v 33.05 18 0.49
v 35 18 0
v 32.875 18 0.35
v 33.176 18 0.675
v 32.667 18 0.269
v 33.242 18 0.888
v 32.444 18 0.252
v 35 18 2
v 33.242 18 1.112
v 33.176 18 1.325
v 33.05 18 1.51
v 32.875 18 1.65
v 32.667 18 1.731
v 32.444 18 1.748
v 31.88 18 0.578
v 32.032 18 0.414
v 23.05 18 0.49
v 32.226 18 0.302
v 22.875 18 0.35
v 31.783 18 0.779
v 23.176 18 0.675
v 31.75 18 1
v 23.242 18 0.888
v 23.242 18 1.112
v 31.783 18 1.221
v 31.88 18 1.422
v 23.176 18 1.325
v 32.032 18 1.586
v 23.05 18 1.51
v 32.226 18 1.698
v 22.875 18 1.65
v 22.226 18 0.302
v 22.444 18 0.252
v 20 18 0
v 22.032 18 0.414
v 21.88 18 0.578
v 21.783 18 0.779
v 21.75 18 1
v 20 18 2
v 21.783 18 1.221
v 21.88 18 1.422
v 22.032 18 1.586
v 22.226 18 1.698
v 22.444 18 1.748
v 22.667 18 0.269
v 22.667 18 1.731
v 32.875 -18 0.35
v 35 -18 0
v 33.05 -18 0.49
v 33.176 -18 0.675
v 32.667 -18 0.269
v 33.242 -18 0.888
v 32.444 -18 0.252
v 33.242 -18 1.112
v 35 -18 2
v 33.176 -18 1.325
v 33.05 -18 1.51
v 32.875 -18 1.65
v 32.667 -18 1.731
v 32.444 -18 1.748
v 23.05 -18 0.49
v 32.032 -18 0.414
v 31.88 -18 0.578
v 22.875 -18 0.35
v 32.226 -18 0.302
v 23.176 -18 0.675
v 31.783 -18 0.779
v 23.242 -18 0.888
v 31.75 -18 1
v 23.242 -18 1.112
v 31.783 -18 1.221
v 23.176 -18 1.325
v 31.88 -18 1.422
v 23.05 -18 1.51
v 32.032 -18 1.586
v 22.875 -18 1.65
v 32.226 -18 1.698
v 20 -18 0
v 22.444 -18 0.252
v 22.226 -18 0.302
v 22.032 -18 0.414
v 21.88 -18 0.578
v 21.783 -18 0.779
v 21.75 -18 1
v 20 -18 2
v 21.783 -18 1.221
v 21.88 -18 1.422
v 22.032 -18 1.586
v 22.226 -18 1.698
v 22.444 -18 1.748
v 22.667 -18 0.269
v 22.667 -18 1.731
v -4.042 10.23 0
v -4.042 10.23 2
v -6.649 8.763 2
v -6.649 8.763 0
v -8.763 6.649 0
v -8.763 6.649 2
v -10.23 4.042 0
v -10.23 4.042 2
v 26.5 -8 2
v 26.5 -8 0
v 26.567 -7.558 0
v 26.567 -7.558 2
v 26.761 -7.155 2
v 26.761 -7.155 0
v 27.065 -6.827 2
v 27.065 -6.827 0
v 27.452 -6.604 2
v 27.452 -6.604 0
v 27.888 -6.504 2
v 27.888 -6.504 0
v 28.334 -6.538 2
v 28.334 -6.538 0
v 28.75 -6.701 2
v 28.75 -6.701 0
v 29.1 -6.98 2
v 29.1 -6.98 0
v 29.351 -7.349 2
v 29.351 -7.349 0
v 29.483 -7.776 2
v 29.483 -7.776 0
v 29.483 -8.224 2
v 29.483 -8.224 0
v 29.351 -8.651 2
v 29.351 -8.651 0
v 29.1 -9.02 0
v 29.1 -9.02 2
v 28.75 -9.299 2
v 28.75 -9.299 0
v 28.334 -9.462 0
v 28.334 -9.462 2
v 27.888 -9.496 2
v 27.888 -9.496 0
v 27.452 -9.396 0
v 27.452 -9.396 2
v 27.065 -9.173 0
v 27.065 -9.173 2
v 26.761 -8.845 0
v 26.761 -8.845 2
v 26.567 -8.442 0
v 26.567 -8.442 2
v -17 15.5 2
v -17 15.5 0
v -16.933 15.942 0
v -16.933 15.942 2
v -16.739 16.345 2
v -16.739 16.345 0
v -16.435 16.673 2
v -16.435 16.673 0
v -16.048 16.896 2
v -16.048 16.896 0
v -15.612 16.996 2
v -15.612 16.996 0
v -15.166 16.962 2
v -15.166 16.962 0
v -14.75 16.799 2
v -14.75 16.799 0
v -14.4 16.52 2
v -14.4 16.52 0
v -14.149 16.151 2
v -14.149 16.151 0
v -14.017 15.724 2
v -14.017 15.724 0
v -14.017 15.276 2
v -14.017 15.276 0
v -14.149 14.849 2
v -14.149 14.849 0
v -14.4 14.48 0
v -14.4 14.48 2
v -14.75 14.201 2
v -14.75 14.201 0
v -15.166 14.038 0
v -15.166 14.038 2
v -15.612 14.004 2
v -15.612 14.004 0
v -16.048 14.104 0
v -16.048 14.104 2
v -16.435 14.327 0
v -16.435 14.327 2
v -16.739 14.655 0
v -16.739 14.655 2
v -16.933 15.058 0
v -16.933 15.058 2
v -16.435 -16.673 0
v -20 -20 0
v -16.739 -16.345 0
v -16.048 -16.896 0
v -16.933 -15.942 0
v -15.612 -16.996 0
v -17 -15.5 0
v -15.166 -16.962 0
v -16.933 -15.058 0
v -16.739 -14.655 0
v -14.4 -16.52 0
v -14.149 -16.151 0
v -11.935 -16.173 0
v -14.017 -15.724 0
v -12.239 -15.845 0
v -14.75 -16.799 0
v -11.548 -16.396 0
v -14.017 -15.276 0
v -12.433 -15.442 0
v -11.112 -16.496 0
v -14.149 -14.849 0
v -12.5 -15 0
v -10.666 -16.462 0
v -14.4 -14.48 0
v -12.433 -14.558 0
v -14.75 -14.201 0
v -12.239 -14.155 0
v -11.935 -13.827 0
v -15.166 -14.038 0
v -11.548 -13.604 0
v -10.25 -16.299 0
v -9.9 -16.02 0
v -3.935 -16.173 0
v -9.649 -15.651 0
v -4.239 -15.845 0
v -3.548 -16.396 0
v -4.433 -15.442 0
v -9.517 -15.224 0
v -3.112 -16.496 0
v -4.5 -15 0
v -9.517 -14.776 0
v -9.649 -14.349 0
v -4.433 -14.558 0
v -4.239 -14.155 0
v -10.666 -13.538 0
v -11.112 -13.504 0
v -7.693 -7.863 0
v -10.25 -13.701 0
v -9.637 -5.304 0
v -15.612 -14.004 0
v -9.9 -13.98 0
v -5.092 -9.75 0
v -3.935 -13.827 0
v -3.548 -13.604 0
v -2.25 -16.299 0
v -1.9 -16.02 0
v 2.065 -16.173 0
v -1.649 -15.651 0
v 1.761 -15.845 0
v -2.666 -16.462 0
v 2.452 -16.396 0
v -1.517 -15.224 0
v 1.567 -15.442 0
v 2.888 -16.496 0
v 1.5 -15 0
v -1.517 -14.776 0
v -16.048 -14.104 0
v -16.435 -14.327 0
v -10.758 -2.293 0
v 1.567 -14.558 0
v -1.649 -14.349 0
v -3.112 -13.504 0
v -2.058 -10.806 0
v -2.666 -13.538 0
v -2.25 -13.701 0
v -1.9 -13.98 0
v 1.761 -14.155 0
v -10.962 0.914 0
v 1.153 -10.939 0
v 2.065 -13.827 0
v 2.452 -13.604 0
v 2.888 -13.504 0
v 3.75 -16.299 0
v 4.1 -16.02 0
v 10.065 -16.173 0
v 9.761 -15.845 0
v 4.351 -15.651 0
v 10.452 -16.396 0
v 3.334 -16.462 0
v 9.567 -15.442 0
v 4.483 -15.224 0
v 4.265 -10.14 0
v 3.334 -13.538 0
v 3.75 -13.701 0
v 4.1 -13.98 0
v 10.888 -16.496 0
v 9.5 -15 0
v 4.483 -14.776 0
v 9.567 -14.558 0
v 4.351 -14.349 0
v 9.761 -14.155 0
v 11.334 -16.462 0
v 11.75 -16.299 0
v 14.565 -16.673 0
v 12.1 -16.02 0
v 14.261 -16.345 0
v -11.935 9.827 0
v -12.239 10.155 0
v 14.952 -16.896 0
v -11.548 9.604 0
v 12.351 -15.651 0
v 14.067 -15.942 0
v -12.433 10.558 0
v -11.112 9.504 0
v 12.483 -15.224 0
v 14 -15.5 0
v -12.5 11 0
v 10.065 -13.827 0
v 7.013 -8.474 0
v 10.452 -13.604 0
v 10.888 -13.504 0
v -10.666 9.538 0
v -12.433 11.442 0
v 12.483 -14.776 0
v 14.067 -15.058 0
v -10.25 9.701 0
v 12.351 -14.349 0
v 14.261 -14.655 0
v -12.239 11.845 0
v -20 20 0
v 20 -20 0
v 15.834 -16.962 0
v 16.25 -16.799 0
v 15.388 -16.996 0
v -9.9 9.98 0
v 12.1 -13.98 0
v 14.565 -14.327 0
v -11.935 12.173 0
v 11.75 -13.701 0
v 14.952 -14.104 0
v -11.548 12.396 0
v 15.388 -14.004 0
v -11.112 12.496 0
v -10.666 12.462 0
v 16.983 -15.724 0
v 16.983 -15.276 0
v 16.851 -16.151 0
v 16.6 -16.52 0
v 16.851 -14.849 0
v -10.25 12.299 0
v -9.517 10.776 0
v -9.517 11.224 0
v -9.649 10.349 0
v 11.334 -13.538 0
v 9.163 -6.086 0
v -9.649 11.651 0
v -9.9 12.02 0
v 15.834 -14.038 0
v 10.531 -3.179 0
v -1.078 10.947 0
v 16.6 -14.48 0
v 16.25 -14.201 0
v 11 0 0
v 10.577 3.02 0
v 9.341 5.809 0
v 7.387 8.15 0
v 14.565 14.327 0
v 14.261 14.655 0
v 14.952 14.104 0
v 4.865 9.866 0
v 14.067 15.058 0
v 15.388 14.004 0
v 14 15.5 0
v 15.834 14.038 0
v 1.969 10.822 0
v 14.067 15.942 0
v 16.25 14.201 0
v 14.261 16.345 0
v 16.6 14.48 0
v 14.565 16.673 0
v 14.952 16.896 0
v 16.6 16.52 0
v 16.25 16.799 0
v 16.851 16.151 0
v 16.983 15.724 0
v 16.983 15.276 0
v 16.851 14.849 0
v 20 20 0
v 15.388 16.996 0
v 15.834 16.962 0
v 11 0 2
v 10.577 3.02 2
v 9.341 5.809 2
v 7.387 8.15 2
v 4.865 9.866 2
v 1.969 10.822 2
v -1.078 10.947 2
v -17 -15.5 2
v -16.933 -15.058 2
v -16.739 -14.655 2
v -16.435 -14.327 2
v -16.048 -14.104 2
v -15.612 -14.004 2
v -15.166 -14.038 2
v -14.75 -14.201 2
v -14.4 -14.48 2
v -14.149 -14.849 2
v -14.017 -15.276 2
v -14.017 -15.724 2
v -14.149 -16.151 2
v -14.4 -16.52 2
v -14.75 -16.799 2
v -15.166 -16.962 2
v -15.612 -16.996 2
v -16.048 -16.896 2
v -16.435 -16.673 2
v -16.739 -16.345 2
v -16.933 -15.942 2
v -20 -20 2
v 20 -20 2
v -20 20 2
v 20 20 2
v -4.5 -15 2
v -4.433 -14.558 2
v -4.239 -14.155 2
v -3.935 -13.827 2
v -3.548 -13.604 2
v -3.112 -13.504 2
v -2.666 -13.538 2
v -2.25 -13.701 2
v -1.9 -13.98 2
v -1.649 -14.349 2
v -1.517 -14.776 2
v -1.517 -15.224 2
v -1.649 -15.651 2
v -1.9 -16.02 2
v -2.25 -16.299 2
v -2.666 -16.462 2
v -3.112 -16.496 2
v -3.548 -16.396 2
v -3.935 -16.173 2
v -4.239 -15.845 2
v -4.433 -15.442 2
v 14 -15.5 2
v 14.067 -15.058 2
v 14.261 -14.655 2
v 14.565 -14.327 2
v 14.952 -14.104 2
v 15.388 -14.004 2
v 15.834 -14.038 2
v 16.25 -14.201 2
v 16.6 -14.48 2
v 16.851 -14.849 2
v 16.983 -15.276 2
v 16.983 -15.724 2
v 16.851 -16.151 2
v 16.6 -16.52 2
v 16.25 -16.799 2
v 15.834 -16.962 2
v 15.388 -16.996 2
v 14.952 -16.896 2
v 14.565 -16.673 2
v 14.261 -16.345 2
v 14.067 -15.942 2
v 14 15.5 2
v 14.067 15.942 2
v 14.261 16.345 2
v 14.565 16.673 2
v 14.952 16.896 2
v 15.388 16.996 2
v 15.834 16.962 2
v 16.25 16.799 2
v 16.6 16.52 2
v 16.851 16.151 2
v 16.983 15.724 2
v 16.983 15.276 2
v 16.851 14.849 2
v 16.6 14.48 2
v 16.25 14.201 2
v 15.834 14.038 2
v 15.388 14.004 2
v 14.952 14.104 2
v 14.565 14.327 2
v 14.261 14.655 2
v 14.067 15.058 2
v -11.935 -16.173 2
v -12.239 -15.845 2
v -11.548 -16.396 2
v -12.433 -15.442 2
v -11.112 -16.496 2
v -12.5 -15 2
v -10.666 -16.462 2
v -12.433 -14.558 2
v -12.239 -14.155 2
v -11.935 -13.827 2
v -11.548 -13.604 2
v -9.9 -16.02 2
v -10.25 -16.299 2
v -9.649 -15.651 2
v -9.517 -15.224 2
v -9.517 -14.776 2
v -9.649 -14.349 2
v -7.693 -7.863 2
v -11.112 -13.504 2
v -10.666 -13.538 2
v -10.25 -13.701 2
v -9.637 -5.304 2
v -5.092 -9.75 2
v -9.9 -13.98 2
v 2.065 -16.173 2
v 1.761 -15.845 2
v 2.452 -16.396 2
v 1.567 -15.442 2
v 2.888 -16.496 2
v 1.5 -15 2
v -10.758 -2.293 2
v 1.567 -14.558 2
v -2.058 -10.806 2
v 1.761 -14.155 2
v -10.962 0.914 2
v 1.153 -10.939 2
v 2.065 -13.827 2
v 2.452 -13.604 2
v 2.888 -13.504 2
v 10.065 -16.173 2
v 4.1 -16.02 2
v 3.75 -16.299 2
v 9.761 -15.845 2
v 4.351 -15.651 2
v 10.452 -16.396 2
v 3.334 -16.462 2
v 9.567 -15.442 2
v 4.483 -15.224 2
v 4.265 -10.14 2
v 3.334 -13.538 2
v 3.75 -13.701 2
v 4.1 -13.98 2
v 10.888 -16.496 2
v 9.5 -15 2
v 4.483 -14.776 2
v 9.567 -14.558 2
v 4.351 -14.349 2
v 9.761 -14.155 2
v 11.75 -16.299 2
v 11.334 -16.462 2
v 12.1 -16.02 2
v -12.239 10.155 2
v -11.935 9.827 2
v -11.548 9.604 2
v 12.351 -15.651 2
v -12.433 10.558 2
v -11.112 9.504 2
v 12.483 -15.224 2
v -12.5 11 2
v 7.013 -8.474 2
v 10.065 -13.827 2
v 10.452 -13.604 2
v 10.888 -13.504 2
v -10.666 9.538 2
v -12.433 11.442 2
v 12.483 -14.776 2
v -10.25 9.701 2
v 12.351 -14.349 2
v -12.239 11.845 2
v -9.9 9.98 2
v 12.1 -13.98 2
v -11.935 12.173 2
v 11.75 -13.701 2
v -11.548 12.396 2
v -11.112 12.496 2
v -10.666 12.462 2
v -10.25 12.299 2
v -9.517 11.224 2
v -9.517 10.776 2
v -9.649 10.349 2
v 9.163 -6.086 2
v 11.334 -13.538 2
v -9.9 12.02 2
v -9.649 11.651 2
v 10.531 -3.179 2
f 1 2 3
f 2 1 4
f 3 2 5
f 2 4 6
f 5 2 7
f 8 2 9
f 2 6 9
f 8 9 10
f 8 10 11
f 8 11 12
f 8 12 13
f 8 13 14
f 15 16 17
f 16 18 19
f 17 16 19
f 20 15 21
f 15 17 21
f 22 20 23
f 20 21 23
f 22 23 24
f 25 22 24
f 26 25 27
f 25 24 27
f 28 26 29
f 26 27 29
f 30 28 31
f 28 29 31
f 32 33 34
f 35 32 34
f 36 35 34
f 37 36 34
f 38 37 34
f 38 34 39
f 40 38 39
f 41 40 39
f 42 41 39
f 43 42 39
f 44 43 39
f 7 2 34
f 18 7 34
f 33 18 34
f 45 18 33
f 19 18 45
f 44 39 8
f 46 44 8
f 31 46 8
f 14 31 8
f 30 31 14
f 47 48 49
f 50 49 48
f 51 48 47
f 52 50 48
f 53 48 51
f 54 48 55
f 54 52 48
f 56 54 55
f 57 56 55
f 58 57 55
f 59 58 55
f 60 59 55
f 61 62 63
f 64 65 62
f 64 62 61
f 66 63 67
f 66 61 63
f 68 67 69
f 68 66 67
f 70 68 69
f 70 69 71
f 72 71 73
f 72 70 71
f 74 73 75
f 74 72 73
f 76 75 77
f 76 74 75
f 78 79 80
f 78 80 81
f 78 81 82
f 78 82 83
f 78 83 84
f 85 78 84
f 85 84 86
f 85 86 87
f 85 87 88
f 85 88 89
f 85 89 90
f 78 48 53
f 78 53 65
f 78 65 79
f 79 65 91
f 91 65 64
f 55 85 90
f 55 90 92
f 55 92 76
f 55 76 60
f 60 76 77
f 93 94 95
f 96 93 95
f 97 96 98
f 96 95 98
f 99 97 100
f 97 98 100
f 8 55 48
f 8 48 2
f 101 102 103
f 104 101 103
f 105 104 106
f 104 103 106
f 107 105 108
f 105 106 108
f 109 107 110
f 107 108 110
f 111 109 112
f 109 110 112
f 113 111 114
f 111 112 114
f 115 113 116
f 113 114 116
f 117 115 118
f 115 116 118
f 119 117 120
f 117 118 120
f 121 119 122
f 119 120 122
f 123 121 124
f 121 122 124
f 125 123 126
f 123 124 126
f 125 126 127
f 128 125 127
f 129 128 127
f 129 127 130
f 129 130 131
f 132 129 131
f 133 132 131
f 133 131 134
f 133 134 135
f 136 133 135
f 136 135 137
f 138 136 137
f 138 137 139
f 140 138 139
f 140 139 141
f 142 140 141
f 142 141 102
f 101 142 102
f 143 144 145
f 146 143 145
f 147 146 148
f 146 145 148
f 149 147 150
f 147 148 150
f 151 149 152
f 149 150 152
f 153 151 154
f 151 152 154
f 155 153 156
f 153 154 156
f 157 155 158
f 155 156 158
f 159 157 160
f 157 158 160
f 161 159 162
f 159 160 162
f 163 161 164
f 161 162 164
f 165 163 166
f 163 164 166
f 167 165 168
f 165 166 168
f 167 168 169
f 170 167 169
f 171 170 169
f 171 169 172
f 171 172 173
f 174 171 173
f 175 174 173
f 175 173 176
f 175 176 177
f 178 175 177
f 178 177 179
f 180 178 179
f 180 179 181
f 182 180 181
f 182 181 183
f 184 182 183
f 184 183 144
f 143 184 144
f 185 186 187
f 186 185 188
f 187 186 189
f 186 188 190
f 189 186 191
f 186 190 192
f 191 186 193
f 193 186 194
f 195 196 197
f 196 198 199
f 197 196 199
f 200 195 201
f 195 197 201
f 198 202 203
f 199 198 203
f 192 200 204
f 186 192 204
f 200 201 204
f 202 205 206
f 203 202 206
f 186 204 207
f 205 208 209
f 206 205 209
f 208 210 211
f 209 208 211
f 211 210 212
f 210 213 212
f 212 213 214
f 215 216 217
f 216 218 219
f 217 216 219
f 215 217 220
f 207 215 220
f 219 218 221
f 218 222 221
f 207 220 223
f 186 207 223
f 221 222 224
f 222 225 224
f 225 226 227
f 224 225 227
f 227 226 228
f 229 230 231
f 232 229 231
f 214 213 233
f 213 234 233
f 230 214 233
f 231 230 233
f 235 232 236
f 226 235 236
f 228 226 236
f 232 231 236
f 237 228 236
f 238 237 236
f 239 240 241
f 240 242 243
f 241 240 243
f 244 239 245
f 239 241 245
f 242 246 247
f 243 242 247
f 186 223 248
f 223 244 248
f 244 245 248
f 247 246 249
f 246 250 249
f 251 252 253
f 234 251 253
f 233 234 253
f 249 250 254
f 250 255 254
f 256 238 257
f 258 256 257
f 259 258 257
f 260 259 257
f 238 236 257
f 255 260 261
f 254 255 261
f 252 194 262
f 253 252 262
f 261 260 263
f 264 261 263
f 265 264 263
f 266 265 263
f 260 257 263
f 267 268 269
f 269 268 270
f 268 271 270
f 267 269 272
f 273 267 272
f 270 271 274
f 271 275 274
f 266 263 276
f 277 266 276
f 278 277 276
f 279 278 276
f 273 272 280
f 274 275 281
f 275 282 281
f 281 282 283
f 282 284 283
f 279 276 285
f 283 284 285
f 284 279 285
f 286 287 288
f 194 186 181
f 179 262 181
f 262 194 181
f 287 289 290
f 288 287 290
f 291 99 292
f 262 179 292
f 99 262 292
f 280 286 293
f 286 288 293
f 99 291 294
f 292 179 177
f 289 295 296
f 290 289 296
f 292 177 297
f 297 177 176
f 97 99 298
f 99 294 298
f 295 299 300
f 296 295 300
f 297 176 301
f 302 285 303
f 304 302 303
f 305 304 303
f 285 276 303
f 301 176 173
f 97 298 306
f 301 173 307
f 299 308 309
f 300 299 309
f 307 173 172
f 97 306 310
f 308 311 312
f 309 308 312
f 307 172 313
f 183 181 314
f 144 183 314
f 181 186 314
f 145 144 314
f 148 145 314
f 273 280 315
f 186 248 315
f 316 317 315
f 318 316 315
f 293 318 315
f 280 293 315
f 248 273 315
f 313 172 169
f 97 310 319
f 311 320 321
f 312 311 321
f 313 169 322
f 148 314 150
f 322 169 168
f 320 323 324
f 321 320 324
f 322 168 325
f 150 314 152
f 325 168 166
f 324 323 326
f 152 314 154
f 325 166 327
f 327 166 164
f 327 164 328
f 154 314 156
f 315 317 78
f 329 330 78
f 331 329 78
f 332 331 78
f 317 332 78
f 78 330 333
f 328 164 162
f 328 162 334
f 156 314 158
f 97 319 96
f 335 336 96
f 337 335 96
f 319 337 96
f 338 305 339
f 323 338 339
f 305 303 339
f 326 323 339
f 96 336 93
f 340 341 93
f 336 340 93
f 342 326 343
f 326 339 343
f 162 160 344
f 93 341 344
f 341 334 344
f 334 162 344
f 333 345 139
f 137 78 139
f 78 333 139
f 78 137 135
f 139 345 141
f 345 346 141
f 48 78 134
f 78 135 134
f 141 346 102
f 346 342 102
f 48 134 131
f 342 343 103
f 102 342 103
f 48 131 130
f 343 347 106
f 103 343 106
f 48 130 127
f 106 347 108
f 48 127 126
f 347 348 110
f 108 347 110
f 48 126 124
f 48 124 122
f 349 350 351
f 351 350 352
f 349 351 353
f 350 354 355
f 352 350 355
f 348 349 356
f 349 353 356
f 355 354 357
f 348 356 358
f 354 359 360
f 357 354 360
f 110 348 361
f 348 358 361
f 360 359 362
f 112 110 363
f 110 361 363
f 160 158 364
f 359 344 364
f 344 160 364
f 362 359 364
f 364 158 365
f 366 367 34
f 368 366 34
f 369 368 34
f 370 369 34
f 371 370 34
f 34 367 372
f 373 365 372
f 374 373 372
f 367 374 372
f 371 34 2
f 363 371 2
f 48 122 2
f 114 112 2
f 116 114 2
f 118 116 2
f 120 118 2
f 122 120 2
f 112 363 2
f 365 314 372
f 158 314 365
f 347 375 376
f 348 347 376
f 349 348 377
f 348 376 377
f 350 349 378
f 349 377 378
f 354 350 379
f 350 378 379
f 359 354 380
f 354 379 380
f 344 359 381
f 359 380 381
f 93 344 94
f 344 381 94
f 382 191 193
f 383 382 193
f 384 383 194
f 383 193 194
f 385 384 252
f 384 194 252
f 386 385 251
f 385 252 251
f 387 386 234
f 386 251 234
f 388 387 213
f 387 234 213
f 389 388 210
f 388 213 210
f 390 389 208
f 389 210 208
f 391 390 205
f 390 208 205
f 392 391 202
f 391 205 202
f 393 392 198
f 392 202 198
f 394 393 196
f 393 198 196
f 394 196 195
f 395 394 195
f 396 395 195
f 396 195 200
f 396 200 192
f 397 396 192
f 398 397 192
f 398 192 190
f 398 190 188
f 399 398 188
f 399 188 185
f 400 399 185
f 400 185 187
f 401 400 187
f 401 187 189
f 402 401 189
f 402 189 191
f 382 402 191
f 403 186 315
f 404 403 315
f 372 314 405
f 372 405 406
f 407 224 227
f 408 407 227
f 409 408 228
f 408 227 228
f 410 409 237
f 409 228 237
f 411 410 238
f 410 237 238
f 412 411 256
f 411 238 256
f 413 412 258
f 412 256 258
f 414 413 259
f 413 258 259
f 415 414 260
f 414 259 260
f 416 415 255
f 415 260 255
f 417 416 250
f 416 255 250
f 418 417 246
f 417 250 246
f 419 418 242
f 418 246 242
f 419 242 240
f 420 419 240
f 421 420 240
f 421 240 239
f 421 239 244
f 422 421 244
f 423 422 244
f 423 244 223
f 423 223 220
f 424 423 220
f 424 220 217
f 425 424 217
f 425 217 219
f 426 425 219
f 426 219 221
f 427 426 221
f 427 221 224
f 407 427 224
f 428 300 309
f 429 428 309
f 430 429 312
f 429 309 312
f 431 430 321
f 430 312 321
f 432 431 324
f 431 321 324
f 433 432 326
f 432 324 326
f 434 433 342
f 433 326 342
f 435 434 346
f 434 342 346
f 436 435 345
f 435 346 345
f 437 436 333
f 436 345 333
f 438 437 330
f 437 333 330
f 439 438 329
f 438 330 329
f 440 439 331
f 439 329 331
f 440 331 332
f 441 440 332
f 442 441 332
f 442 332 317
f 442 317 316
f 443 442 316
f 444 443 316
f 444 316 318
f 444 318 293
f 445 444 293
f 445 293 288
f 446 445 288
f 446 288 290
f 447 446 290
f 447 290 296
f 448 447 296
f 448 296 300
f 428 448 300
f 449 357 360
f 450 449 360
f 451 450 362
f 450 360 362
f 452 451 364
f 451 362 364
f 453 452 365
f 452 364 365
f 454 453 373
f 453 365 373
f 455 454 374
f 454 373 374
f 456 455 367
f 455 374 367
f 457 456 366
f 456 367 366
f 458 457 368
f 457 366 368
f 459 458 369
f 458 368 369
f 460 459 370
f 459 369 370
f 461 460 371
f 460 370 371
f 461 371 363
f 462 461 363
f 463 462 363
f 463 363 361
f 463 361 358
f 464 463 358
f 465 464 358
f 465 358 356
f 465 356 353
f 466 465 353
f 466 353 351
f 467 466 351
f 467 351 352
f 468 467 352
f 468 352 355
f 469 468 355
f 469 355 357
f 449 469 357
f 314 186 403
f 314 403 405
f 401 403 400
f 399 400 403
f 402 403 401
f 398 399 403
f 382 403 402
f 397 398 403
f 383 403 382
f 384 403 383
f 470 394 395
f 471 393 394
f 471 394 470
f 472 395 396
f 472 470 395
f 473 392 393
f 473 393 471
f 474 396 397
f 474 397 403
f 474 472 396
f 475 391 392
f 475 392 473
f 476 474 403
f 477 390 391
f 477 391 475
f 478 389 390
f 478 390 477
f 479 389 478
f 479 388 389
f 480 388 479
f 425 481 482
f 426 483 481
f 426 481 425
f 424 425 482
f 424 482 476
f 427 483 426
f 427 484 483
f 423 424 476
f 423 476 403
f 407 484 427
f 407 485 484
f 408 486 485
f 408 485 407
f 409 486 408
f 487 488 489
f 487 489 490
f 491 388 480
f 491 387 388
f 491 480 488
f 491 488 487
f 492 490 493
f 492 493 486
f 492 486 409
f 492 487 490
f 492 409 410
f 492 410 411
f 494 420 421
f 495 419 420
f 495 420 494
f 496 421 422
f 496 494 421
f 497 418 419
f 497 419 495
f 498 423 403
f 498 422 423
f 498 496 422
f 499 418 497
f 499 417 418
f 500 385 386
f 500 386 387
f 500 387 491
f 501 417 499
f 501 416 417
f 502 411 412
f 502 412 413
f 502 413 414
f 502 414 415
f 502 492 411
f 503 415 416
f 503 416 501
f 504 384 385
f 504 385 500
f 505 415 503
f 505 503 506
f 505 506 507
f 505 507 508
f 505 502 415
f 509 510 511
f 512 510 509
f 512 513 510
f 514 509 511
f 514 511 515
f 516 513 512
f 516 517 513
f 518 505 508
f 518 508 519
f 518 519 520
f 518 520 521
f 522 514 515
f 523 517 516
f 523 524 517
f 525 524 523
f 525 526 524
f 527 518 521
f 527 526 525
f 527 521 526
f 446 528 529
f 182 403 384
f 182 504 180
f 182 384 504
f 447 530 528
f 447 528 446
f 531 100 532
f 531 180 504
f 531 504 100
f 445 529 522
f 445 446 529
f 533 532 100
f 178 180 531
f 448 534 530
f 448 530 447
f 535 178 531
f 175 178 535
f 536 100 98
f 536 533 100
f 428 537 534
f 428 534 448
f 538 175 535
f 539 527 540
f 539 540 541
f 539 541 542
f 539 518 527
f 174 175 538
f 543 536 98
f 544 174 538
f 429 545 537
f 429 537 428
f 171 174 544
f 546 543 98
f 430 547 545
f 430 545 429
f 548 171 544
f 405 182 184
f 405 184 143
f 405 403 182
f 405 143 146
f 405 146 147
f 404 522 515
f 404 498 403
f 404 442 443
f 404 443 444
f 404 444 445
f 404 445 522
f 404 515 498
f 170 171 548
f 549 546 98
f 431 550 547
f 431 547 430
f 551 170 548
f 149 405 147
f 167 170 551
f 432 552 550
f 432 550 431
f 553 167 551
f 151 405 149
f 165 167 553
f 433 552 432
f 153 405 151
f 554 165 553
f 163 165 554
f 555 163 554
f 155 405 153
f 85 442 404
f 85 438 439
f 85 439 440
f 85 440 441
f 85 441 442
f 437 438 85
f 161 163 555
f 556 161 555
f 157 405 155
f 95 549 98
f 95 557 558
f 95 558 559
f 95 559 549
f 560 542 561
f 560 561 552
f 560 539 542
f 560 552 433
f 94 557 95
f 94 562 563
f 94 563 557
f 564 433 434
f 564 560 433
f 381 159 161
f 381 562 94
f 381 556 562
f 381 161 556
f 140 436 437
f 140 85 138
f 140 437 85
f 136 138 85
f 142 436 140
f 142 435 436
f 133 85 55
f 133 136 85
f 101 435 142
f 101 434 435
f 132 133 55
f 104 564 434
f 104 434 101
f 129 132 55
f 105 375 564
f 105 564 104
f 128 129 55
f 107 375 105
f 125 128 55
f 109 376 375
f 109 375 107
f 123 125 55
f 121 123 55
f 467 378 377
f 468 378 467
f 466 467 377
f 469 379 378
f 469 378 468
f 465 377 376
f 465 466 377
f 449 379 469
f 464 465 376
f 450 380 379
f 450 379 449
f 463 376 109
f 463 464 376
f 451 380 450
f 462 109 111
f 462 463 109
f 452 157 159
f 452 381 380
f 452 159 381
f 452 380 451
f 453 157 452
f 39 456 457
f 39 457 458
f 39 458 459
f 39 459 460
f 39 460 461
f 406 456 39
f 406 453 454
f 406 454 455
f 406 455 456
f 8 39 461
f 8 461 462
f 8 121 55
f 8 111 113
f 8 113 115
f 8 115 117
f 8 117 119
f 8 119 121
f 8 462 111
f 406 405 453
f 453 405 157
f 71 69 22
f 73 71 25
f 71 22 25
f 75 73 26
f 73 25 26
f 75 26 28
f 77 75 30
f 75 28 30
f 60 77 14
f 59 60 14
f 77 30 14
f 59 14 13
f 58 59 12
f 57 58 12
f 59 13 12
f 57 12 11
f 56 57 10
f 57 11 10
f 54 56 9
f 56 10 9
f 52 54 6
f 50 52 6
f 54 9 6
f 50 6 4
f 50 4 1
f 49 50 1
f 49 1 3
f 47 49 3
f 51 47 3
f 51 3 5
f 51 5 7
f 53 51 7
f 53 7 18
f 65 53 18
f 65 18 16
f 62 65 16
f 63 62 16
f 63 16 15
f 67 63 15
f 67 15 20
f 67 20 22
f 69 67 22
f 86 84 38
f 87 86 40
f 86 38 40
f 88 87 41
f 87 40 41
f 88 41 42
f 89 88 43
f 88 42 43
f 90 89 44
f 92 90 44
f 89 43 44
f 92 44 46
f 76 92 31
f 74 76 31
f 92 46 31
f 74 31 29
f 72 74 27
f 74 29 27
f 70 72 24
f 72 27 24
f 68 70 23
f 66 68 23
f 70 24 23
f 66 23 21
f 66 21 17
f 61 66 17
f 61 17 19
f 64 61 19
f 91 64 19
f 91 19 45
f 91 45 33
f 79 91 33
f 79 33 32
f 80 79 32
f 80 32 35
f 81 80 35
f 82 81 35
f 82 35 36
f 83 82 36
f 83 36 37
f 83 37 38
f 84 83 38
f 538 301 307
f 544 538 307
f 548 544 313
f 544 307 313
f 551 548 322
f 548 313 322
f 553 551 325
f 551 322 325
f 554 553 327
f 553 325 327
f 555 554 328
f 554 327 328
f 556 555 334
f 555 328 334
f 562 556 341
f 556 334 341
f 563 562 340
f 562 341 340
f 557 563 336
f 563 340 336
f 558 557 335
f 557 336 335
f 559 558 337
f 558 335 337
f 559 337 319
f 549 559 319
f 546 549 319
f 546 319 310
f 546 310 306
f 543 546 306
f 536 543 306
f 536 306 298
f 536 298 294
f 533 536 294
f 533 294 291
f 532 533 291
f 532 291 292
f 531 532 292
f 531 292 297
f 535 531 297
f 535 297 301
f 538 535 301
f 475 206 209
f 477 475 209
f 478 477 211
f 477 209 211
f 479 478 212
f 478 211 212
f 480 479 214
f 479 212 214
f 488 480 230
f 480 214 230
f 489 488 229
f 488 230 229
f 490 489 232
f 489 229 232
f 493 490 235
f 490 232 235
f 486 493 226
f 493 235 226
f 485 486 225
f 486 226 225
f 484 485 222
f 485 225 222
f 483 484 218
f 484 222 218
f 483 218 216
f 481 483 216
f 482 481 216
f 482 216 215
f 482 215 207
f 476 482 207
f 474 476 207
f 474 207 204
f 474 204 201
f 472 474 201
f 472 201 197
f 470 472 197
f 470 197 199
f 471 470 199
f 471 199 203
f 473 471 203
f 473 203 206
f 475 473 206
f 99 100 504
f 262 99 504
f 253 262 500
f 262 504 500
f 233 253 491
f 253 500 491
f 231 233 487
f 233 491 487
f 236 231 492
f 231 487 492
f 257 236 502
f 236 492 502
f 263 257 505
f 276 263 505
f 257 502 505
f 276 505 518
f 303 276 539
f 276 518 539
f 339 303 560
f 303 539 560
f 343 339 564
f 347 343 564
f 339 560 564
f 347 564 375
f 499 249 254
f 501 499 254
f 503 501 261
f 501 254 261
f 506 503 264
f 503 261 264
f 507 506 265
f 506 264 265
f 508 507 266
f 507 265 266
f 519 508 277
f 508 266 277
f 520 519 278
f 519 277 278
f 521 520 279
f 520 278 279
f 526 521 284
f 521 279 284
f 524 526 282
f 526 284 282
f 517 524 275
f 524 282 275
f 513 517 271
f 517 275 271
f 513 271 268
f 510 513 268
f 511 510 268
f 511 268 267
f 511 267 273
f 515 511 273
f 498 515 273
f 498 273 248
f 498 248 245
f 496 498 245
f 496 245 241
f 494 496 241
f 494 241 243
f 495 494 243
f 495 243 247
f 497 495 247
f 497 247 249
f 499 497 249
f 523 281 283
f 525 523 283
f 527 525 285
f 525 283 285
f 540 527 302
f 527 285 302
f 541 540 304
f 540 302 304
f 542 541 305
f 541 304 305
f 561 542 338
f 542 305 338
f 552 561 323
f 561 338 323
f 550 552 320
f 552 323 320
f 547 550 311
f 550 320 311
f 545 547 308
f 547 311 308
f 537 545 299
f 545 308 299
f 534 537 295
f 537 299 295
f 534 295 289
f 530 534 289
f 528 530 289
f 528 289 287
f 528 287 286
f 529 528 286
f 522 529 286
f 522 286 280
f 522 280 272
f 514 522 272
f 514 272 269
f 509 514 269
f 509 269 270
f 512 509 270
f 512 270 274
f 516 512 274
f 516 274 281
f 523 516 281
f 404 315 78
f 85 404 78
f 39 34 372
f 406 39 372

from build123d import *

# Parameters (mm, degrees)
F0_W     = 40
F0_H     = 40
F1_DEPTH = 2
F2_W     = 36
F2_H     = 2
F3_DEPTH = 15
F5_D     = 3
F5_DEPTH = 18
F4_R     = 7
F6_DEPTH = 25
F8_D     = 1.5
F8_DEPTH = 50


with BuildPart() as f1:
    # F0 (on Top) → F1 (new body)
    with BuildSketch(Plane.XY):
        Rectangle(F0_W, F0_H)
    extrude(amount=F1_DEPTH)

    # F2 (on face) → F3 (join)
    with BuildSketch(Plane.YZ.offset(20)):
        with Locations((0, 1)):
            Rectangle(F2_W, F2_H)
    extrude(amount=F3_DEPTH)

    # F5
    with Locations(Plane.XY.offset(2)):
        with Locations((-11, -15), (11, -15), (28, -8), (-11, 11), (-3, -15), (3, -15), (15.5, 15.5), (-15.5, 15.5), (-15.5, -15.5), (15.5, -15.5)):
            Hole(F5_D / 2, depth=F5_DEPTH)

    # F4 (on face) → F6 (cut)
    with BuildSketch(Plane.XY.offset(2)):
        with BuildLine():
            ThreePointArc((-4.042448, 10.230279), (-6.050253, 6.050253), (-10.230279, 4.042448))
            ThreePointArc((-10.230279, 4.042448), (-2.057538, -10.805857), (11, 0))
            ThreePointArc((11, 0), (6.185995, 9.095794), (-4.042448, 10.230279))
        make_face()
        Circle(F4_R, mode=Mode.SUBTRACT)
        Circle(F4_R)
        with BuildLine():
            ThreePointArc((-4.042448, 10.230279), (-7.778175, 7.778175), (-10.230279, 4.042448))
            ThreePointArc((-10.230279, 4.042448), (-6.050253, 6.050253), (-4.042448, 10.230279))
        make_face()
    extrude(amount=-F6_DEPTH, mode=Mode.SUBTRACT)

    # F8
    with Locations(Plane.XZ.offset(18)):
        with Locations((22.5, 1), (32.5, 1)):
            Hole(F8_D / 2, depth=F8_DEPTH)


solid = f1.part
